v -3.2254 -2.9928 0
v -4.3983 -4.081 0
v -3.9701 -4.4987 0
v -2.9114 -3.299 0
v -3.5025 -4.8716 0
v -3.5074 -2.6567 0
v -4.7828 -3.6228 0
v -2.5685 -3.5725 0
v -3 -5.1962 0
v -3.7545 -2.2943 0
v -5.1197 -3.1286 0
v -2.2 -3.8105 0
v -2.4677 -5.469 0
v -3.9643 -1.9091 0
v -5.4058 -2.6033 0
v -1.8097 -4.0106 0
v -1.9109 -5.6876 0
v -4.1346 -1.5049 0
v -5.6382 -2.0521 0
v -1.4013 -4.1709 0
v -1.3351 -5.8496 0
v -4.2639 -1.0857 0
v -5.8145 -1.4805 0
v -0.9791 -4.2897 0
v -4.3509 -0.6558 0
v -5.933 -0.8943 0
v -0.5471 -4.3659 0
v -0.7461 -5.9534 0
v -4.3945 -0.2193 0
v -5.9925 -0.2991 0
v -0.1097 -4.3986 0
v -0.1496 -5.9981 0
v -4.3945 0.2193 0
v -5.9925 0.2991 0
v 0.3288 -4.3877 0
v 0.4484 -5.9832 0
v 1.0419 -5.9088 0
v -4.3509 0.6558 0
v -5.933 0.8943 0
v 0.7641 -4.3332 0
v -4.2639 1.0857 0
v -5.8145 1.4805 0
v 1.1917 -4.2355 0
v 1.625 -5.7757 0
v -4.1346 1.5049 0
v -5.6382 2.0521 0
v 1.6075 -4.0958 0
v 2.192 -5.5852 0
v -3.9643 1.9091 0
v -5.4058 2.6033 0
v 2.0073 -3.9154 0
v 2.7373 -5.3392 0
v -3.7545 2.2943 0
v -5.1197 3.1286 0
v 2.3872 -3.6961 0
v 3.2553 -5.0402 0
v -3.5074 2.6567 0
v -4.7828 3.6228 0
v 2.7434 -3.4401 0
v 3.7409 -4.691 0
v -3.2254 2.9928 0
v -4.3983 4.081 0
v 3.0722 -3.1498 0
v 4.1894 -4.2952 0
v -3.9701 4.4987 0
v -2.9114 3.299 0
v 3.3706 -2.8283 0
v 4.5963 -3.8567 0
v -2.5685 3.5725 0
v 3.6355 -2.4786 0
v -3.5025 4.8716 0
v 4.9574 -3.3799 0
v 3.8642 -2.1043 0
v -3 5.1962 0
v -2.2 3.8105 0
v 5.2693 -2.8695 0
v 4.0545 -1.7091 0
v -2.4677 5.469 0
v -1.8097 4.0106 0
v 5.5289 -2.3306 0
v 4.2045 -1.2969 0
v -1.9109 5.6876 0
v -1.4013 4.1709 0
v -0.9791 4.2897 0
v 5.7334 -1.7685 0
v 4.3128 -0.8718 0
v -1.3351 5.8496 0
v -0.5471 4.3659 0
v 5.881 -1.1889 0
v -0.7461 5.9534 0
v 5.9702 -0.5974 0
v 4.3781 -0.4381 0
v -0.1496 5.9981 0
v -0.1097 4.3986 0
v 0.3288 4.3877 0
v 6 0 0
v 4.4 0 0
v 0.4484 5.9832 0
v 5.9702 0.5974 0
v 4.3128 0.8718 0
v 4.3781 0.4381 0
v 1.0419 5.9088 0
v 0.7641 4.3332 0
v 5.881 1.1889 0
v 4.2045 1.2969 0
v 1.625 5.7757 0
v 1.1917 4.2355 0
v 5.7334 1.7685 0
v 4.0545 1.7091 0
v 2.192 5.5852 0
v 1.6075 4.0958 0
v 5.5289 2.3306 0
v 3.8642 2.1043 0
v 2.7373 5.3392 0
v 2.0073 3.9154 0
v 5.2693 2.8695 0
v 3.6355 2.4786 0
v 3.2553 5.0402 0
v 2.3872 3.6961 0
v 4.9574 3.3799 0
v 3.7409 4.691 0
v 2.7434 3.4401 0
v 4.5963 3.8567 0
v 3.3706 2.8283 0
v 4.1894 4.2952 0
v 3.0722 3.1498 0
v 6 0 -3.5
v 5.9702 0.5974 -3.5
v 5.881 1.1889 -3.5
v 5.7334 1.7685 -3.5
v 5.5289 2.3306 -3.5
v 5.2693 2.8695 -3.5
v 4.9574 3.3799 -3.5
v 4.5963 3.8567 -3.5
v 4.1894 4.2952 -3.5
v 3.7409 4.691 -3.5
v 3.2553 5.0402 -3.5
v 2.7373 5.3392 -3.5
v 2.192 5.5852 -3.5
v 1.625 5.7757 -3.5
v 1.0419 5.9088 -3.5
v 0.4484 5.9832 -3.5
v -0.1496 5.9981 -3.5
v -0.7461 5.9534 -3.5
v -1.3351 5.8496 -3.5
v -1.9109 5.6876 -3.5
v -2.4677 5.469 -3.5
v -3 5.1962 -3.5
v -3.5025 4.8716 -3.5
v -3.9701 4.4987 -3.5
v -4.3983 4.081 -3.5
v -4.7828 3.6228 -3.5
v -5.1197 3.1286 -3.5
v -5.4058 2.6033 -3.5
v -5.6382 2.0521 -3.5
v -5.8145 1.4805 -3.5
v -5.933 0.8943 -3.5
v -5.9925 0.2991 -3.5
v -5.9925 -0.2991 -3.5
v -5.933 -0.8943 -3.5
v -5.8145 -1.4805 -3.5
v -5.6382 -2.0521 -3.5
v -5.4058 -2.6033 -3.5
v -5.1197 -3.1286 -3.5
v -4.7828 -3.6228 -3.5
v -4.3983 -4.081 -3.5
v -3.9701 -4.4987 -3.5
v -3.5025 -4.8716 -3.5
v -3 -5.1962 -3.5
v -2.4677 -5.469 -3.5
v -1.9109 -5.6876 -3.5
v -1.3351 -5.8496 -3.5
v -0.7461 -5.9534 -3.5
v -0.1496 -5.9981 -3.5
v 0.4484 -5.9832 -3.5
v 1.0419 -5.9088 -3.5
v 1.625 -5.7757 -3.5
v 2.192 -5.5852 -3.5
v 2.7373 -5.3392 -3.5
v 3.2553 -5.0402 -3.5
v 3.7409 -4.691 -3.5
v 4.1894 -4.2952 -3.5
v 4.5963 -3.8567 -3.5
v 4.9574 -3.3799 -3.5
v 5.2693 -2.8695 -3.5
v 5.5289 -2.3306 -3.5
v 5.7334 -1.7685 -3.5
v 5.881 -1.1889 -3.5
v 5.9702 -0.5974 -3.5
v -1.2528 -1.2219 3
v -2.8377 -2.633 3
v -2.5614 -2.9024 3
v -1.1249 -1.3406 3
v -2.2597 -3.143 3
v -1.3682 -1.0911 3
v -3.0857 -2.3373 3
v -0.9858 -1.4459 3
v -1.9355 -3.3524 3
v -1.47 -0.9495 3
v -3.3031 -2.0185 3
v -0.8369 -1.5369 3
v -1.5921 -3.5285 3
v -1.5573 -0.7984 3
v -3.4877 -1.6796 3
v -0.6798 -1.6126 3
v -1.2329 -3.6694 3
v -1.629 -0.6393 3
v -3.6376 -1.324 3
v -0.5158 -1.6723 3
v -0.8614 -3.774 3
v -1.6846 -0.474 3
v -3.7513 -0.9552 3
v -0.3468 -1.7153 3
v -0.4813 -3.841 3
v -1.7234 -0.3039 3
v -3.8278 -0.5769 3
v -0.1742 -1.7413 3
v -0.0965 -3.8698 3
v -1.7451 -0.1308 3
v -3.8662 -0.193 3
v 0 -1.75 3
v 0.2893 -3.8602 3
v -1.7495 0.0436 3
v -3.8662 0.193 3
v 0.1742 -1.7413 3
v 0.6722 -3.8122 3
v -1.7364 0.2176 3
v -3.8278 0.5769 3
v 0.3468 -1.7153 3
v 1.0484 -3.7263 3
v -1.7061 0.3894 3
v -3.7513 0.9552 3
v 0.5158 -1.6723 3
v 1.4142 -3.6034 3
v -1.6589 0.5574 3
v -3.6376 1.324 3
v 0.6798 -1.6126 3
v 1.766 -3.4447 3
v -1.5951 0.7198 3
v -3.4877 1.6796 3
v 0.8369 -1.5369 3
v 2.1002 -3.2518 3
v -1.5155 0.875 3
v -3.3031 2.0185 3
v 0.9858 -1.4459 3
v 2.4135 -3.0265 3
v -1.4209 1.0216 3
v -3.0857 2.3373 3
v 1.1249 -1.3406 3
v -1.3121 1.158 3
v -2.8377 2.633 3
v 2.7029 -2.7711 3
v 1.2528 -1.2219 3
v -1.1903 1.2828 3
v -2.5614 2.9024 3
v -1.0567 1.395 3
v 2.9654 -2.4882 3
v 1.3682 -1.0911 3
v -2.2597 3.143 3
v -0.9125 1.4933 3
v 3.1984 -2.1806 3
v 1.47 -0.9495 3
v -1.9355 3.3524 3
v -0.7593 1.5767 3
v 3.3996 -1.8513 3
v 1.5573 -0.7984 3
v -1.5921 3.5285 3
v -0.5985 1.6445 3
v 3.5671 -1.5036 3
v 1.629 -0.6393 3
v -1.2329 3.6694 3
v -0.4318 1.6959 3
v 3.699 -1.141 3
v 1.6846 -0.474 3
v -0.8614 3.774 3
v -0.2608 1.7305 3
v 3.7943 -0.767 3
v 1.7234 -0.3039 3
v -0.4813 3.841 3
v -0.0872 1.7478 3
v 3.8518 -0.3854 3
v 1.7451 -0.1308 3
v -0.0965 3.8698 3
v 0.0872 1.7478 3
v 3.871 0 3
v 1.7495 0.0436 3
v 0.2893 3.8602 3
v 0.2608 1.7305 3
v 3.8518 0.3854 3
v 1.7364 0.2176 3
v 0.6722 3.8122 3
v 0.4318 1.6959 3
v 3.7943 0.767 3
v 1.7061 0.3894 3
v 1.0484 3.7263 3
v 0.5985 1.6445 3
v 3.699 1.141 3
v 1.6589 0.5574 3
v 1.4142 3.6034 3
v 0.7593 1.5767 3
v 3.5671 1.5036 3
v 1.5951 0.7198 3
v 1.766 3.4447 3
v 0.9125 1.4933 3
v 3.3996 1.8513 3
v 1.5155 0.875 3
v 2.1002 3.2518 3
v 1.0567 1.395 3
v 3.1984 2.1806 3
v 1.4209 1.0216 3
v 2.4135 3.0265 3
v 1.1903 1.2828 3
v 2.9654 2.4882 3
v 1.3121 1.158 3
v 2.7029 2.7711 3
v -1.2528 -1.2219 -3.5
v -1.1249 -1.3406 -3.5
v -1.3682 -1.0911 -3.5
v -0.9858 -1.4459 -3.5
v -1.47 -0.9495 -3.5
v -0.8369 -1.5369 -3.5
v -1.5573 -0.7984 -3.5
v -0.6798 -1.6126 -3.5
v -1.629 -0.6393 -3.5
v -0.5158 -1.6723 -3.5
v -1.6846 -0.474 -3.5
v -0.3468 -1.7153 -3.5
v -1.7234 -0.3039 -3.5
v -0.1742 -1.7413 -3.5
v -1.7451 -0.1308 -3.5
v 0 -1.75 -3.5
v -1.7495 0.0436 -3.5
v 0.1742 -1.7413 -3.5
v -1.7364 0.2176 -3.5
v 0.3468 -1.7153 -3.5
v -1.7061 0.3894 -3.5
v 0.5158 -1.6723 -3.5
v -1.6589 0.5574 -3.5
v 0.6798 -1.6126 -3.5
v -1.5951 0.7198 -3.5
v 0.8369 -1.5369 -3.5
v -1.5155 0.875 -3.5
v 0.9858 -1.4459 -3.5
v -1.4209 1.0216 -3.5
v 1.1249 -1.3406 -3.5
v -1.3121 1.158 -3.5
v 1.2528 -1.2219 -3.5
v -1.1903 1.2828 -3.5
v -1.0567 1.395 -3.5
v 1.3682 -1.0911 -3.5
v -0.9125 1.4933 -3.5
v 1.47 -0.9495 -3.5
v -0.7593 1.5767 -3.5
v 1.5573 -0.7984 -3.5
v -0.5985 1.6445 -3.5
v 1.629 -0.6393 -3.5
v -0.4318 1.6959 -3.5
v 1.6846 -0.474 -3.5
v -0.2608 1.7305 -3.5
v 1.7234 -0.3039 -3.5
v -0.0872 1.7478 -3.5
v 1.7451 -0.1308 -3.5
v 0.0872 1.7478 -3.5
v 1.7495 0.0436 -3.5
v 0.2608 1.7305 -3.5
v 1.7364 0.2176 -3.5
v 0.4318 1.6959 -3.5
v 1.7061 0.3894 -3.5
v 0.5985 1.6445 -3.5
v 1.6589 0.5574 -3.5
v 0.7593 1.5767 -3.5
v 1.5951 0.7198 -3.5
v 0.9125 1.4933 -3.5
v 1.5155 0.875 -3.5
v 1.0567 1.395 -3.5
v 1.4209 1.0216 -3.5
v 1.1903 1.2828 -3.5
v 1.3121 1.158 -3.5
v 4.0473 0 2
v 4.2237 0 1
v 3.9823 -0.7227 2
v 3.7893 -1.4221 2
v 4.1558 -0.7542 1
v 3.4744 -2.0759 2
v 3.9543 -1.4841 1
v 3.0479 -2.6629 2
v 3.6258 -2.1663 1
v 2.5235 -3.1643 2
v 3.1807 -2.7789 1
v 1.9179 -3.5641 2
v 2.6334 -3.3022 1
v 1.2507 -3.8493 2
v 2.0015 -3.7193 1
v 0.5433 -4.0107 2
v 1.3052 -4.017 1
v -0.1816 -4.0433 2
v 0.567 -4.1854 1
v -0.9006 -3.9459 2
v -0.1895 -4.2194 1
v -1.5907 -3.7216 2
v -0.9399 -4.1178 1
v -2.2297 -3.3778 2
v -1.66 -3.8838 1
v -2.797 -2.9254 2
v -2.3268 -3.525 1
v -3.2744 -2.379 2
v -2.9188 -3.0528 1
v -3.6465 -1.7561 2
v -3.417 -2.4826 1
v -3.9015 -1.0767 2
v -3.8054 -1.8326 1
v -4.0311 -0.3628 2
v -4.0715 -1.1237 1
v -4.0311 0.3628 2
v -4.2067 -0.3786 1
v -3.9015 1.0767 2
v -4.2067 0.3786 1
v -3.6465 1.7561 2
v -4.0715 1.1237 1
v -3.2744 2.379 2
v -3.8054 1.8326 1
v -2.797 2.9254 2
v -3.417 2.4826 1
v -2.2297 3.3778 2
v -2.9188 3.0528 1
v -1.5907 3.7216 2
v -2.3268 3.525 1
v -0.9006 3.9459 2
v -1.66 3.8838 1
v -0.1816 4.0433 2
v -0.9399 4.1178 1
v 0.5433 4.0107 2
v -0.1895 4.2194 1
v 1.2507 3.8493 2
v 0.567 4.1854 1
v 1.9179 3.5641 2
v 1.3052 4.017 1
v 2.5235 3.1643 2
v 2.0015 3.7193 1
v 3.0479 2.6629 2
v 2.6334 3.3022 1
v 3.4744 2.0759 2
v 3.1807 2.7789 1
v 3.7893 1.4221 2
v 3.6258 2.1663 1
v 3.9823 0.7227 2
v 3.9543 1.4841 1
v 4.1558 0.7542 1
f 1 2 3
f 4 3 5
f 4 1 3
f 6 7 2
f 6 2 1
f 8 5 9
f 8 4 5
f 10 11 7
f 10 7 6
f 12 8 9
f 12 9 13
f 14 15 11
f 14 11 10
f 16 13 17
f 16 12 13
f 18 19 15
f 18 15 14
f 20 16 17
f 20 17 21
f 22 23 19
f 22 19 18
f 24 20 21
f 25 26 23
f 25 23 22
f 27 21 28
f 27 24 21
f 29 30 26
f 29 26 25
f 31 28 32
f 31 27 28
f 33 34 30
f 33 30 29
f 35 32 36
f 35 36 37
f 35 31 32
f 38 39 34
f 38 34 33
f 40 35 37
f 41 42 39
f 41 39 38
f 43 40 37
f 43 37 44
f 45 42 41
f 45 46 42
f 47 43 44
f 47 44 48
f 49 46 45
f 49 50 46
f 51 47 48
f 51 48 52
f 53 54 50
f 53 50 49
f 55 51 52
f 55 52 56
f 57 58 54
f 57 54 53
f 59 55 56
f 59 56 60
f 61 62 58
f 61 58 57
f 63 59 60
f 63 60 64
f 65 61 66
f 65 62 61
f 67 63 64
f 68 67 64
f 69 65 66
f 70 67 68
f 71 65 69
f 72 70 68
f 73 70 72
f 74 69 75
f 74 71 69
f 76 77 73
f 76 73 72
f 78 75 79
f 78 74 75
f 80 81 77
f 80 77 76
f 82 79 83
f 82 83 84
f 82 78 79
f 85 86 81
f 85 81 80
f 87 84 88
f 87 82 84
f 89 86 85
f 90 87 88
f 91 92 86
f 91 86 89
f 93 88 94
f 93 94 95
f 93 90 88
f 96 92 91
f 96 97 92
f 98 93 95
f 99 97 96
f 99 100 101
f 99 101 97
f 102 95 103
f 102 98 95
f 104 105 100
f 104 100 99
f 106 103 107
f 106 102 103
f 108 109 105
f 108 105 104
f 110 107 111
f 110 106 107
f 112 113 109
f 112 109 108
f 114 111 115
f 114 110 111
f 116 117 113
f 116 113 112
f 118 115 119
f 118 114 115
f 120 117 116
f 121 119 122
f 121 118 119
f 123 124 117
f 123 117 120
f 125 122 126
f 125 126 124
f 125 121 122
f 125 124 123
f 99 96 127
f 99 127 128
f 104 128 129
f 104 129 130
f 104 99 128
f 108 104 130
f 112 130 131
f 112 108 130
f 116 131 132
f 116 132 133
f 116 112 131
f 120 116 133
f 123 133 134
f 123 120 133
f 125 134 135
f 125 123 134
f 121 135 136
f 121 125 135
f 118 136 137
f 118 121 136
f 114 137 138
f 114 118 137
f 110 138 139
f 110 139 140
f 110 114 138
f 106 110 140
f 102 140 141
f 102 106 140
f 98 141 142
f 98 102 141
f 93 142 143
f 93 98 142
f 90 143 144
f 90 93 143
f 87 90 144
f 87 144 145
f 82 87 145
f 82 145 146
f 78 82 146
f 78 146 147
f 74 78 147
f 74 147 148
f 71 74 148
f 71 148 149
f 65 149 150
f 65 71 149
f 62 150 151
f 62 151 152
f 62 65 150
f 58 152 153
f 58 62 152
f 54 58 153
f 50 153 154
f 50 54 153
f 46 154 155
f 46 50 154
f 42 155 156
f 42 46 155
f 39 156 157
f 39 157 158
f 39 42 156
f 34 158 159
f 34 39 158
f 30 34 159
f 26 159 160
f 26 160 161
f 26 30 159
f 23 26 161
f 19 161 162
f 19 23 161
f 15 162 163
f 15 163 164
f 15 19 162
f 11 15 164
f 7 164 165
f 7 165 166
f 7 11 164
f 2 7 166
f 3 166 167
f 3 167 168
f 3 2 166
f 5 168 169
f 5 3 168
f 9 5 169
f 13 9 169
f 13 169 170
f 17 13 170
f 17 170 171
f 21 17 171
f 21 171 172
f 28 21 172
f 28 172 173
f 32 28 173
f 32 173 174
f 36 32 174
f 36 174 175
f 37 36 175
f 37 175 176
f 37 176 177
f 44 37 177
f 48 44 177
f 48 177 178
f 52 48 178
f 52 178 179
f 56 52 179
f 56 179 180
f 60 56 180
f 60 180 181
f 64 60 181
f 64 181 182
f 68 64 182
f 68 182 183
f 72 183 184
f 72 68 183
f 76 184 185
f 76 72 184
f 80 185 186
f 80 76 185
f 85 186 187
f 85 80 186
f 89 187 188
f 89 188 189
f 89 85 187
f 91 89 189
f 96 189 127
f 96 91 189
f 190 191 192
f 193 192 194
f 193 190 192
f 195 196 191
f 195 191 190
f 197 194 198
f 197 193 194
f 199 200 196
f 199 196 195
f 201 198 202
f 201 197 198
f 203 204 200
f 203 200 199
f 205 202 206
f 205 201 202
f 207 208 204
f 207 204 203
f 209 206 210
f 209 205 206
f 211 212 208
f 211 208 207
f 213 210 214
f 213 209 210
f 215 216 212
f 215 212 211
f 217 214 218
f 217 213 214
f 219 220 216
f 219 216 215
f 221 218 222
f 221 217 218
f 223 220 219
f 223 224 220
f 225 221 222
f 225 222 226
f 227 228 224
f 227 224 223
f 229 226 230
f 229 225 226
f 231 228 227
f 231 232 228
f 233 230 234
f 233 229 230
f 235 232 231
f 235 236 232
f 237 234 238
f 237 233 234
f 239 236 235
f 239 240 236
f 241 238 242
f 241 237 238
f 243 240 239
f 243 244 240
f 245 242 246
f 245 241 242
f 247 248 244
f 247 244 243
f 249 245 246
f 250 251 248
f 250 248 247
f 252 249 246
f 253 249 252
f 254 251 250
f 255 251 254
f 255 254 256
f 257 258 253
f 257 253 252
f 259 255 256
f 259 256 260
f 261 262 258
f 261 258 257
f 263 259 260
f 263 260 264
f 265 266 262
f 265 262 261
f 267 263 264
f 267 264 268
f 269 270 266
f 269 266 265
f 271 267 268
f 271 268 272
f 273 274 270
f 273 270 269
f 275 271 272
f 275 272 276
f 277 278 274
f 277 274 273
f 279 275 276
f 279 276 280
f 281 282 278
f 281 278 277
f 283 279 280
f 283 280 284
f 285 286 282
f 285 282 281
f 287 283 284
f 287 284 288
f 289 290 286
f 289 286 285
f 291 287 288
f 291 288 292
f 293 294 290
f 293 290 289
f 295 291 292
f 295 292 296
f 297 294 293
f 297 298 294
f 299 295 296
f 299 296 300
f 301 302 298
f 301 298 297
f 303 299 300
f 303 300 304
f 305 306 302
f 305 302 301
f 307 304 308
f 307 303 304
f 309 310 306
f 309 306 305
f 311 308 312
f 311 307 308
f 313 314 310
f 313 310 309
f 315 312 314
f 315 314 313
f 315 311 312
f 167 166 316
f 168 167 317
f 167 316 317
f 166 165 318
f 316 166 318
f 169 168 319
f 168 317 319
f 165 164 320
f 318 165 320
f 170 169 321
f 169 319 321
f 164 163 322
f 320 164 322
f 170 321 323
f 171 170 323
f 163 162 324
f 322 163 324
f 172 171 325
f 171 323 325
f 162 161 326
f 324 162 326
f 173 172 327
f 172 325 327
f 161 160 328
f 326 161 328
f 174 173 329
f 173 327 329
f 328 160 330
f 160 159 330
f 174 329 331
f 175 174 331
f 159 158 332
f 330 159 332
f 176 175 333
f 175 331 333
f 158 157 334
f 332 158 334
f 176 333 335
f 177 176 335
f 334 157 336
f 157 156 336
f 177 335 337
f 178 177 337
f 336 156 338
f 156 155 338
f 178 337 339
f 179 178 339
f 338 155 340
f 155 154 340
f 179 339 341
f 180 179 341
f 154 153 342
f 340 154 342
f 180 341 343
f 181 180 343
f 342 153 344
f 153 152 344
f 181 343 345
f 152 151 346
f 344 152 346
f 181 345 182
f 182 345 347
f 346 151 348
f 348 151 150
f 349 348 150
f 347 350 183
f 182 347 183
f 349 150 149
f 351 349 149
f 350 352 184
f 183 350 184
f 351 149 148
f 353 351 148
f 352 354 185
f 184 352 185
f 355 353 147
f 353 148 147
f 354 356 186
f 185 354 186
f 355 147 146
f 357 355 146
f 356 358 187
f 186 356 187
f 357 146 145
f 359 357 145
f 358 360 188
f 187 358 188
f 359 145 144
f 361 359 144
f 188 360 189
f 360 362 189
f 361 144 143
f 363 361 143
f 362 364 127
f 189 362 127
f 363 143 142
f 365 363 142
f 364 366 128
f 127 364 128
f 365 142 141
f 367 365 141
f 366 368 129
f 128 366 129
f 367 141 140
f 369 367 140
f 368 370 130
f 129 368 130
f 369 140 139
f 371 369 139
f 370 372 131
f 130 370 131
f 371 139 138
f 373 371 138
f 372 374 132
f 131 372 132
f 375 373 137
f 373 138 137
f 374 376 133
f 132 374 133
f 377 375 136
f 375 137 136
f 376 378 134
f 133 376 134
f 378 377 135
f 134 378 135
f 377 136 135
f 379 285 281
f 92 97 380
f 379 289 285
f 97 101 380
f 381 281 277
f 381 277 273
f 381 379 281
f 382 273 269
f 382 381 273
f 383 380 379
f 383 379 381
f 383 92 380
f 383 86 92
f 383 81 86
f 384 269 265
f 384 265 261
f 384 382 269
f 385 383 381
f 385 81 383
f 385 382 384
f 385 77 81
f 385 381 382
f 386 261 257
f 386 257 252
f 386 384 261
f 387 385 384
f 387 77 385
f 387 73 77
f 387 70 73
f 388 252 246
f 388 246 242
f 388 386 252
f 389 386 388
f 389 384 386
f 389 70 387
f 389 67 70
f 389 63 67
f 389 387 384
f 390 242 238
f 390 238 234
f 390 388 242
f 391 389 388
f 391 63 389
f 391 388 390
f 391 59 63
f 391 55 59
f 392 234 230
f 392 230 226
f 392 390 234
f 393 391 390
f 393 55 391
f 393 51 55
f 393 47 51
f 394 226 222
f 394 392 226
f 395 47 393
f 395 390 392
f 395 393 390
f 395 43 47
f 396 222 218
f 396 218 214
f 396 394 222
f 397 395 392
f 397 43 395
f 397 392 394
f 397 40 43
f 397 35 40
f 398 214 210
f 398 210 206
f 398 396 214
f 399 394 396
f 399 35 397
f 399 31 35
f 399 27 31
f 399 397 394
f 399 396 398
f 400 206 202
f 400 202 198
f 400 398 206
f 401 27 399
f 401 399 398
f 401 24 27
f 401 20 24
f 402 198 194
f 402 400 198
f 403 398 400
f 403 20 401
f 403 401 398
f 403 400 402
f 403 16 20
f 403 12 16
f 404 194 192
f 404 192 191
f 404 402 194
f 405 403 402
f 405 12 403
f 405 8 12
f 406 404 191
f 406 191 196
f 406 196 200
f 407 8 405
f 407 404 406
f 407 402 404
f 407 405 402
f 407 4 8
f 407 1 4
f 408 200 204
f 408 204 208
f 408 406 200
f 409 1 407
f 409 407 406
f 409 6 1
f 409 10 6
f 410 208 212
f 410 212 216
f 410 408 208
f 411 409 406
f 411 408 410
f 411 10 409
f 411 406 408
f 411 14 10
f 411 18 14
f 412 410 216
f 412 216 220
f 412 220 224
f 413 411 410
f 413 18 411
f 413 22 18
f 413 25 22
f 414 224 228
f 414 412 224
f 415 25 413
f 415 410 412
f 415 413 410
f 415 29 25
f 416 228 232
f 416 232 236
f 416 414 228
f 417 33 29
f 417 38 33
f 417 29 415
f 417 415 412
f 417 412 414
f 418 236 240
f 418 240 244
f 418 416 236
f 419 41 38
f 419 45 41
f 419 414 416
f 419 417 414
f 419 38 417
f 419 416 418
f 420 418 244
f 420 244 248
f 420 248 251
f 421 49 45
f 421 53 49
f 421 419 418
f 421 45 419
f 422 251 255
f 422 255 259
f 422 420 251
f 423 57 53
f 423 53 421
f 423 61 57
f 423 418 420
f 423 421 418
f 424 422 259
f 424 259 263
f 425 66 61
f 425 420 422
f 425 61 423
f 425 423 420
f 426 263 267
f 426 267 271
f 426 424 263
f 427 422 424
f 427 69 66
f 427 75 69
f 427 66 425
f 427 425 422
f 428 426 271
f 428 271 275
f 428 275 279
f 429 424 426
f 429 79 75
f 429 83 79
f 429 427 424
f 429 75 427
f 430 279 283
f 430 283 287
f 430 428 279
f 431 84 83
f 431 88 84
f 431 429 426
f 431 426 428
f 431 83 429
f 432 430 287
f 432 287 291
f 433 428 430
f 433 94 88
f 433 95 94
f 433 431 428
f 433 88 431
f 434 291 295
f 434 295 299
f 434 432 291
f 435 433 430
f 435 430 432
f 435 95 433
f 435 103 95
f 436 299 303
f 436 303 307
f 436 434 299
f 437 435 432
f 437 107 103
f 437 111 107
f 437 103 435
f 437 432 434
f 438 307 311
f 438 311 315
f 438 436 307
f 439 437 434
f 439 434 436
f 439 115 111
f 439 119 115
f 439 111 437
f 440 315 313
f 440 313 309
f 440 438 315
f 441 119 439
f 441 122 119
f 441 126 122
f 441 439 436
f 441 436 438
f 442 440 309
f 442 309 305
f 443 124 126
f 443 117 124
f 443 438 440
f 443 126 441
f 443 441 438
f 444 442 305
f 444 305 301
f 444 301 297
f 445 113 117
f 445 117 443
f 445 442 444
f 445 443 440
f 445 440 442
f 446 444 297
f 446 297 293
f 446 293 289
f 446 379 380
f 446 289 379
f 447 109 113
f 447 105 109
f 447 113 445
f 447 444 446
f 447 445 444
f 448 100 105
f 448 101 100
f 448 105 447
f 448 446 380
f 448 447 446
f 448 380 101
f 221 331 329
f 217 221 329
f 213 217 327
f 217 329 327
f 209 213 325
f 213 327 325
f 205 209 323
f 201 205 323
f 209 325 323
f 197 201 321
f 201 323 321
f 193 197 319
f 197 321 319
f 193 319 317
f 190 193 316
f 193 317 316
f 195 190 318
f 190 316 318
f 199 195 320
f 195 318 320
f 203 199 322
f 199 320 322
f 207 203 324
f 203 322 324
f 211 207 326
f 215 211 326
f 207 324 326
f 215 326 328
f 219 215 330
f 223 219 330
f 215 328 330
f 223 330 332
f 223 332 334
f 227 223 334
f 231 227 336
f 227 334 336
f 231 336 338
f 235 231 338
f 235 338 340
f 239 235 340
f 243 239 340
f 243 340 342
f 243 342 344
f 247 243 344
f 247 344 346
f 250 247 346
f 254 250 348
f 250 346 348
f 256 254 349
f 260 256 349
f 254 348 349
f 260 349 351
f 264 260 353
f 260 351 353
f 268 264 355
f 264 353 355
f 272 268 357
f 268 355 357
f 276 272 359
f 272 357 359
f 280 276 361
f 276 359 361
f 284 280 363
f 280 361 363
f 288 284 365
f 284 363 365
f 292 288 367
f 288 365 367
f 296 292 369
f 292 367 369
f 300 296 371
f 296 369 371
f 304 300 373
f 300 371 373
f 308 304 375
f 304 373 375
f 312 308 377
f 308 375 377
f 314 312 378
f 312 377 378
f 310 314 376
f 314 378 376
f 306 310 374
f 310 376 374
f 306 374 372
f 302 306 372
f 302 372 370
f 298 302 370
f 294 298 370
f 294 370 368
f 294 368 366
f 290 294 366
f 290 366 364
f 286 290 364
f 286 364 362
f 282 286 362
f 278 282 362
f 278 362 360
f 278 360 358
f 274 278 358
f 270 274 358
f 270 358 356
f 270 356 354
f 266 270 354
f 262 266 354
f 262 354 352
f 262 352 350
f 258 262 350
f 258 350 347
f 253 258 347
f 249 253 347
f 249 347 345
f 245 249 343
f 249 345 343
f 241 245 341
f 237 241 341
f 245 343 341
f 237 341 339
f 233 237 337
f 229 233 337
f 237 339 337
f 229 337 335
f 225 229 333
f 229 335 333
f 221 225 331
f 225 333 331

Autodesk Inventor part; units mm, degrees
ref_plane "YZ Plane" through (0, 0, 0) normal (1, 0, 0) x (0, 1, 0)
ref_plane "XZ Plane" through (0, 0, 0) normal (0, 1, 0) x (-1, 0, 0)
ref_plane "XY Plane" through (0, 0, 0) normal (0, 0, 1) x (1, 0, 0)
sketch "Sketch1" plane through (0, 0, 0) normal (0, 0, 1) x (1, 0, 0)
  circle A0 centre (0, 0) radius 6
  circle A1 centre (0, 0) radius 4.4
  dimension "d0" = 12
  dimension "d1" = 8.8
extrude "Extrusion1" add sketch "Sketch1" against normal blind 3.5 contours A0 | A1
extrude "Extrusion2" add sketch "Sketch1" along normal blind 3 draft -10 contours A1
hole "Hole1" at (0, 0, 3) direction (0, 0, -1) diameter 3.5 end through all
properties part number "segment0_coupler1" material "ABS Plastic"
